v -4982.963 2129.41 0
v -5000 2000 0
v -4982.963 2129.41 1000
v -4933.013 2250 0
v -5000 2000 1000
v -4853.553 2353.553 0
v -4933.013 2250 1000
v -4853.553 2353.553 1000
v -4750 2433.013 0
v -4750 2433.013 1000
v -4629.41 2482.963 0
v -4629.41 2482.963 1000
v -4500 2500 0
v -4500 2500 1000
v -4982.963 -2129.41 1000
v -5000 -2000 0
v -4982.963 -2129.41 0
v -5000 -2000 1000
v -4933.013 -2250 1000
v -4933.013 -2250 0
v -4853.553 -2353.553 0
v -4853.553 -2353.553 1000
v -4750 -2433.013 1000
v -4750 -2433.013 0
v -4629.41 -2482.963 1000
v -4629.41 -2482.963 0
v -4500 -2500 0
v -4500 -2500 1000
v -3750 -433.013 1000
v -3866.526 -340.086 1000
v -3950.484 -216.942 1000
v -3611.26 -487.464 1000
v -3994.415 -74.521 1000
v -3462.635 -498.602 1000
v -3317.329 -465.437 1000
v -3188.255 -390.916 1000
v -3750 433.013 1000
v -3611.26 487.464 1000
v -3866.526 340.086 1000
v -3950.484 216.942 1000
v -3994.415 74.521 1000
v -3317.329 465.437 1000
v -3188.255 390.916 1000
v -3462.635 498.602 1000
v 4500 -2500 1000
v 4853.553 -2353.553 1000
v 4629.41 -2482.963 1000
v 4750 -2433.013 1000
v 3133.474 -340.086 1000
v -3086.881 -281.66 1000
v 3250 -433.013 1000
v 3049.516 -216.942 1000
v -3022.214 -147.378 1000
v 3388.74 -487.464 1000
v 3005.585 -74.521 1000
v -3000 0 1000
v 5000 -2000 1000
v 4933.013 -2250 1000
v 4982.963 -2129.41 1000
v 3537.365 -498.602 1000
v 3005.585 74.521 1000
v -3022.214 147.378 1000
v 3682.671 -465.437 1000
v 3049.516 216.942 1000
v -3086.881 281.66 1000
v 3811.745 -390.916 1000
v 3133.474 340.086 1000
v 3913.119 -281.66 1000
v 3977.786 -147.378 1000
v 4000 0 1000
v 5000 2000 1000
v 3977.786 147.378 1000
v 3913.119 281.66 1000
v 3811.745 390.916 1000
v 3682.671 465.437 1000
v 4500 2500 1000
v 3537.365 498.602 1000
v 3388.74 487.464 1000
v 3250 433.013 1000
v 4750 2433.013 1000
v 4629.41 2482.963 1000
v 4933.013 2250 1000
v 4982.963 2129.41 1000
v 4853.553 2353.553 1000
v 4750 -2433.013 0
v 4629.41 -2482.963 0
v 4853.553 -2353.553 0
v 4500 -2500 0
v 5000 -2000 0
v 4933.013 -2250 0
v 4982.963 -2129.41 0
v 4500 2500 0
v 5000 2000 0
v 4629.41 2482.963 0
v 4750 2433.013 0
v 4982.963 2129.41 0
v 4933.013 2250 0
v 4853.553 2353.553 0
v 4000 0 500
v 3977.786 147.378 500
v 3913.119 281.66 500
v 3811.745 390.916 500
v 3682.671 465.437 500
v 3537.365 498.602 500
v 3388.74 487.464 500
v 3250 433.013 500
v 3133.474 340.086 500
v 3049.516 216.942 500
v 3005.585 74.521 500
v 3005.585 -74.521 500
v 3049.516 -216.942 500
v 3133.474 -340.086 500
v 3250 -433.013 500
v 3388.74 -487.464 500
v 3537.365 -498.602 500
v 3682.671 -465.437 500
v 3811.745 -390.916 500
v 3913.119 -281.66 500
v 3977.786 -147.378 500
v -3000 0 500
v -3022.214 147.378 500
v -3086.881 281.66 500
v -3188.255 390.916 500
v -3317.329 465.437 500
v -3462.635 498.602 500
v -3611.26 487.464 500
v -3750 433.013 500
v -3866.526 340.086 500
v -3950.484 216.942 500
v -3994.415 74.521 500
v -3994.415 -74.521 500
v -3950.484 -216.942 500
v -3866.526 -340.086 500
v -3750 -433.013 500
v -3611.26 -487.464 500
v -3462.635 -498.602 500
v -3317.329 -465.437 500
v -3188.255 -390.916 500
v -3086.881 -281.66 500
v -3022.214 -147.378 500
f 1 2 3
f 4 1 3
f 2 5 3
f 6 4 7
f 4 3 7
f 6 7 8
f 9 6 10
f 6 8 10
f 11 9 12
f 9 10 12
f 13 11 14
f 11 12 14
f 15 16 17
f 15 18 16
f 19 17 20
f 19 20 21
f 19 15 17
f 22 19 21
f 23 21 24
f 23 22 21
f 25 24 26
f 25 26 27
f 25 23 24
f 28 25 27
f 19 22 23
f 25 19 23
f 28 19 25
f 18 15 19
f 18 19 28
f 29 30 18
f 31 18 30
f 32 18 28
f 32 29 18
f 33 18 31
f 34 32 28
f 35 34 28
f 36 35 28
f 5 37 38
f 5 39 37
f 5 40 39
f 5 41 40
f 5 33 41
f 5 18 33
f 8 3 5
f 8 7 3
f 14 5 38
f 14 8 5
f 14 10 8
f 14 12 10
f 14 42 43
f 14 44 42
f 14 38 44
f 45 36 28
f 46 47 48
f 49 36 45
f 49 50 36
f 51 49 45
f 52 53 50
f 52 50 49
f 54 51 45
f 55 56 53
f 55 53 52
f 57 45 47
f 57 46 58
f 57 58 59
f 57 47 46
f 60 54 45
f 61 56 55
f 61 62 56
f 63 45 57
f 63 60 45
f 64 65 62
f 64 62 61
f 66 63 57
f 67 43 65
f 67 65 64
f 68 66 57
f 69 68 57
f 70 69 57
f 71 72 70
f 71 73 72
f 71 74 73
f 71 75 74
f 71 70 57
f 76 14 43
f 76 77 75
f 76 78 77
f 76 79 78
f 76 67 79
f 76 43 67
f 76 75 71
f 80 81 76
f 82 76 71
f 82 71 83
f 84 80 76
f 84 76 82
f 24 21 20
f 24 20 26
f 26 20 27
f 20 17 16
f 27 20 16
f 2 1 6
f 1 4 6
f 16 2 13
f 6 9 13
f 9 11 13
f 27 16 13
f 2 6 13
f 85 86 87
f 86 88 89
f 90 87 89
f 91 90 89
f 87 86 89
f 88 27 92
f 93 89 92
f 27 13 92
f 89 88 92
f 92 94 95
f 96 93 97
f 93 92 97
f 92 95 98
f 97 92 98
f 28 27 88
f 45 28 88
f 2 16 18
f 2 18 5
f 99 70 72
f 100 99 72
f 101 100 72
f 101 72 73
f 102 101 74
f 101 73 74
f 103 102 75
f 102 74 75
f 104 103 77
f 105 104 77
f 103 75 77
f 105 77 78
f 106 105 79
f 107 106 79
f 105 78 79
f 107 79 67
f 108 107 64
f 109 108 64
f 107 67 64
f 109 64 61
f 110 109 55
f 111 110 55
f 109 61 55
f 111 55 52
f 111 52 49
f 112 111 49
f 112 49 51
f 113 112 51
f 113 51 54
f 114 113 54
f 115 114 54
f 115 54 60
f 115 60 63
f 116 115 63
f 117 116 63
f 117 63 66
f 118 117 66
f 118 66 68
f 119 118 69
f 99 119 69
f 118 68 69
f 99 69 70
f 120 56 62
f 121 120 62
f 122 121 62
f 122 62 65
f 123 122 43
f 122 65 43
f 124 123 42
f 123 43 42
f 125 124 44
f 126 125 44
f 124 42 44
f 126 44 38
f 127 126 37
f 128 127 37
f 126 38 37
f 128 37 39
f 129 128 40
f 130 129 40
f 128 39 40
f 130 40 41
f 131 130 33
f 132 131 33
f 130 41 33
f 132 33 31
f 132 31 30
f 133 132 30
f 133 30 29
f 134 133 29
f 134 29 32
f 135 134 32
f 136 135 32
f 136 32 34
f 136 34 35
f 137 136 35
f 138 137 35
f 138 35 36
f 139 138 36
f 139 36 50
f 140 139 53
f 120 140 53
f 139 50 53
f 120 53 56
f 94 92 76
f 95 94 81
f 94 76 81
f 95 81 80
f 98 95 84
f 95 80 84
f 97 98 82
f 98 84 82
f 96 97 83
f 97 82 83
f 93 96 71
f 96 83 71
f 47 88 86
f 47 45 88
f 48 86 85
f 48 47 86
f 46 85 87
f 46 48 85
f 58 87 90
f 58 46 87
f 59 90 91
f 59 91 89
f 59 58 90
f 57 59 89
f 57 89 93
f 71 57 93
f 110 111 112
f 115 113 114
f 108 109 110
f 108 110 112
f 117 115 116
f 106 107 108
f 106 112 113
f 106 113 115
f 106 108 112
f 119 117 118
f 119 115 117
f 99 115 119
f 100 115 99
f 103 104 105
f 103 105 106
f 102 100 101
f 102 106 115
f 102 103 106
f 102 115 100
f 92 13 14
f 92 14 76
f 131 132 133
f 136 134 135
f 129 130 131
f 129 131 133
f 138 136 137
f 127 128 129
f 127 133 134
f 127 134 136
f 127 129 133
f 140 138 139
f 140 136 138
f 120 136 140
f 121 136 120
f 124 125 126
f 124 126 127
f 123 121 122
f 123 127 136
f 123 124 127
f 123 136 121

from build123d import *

# Parameters (mm, degrees)
SKETCH1_W           = 10000
SKETCH1_H           = 5000
BOSS_EXTRUDE1_DEPTH = 1000
FILLET1_R           = 500
FILLET2_R           = 500
SKETCH2_R           = 500
CUT_EXTRUDE1_DEPTH  = 500


with BuildPart() as part:
    # Sketch1 → Boss-Extrude1 (new body)
    with BuildSketch(Plane.XY):
        Rectangle(SKETCH1_W, SKETCH1_H)
    extrude(amount=BOSS_EXTRUDE1_DEPTH)

    # Fillet1
    fillet1_edges = [part.edges().sort_by_distance(p)[0] for p in [
        (-5000, 2500, 500),
    ]]
    fillet(fillet1_edges, radius=FILLET1_R)

    # Fillet2
    fillet2_edges = [part.edges().sort_by_distance(p)[0] for p in [
        (5000, -2500, 500),
        (-5000, -2500, 500),
        (5000, 2500, 500),
    ]]
    fillet(fillet2_edges, radius=FILLET2_R)

    # Sketch2 → Cut-Extrude1 (cut)
    with BuildSketch(Plane.XY.offset(1000)):
        with Locations((-3500, 0)):
            Circle(SKETCH2_R)
        with Locations((3500, 0)):
            Circle(SKETCH2_R)
    extrude(amount=-CUT_EXTRUDE1_DEPTH, mode=Mode.SUBTRACT)


solid = part.part
